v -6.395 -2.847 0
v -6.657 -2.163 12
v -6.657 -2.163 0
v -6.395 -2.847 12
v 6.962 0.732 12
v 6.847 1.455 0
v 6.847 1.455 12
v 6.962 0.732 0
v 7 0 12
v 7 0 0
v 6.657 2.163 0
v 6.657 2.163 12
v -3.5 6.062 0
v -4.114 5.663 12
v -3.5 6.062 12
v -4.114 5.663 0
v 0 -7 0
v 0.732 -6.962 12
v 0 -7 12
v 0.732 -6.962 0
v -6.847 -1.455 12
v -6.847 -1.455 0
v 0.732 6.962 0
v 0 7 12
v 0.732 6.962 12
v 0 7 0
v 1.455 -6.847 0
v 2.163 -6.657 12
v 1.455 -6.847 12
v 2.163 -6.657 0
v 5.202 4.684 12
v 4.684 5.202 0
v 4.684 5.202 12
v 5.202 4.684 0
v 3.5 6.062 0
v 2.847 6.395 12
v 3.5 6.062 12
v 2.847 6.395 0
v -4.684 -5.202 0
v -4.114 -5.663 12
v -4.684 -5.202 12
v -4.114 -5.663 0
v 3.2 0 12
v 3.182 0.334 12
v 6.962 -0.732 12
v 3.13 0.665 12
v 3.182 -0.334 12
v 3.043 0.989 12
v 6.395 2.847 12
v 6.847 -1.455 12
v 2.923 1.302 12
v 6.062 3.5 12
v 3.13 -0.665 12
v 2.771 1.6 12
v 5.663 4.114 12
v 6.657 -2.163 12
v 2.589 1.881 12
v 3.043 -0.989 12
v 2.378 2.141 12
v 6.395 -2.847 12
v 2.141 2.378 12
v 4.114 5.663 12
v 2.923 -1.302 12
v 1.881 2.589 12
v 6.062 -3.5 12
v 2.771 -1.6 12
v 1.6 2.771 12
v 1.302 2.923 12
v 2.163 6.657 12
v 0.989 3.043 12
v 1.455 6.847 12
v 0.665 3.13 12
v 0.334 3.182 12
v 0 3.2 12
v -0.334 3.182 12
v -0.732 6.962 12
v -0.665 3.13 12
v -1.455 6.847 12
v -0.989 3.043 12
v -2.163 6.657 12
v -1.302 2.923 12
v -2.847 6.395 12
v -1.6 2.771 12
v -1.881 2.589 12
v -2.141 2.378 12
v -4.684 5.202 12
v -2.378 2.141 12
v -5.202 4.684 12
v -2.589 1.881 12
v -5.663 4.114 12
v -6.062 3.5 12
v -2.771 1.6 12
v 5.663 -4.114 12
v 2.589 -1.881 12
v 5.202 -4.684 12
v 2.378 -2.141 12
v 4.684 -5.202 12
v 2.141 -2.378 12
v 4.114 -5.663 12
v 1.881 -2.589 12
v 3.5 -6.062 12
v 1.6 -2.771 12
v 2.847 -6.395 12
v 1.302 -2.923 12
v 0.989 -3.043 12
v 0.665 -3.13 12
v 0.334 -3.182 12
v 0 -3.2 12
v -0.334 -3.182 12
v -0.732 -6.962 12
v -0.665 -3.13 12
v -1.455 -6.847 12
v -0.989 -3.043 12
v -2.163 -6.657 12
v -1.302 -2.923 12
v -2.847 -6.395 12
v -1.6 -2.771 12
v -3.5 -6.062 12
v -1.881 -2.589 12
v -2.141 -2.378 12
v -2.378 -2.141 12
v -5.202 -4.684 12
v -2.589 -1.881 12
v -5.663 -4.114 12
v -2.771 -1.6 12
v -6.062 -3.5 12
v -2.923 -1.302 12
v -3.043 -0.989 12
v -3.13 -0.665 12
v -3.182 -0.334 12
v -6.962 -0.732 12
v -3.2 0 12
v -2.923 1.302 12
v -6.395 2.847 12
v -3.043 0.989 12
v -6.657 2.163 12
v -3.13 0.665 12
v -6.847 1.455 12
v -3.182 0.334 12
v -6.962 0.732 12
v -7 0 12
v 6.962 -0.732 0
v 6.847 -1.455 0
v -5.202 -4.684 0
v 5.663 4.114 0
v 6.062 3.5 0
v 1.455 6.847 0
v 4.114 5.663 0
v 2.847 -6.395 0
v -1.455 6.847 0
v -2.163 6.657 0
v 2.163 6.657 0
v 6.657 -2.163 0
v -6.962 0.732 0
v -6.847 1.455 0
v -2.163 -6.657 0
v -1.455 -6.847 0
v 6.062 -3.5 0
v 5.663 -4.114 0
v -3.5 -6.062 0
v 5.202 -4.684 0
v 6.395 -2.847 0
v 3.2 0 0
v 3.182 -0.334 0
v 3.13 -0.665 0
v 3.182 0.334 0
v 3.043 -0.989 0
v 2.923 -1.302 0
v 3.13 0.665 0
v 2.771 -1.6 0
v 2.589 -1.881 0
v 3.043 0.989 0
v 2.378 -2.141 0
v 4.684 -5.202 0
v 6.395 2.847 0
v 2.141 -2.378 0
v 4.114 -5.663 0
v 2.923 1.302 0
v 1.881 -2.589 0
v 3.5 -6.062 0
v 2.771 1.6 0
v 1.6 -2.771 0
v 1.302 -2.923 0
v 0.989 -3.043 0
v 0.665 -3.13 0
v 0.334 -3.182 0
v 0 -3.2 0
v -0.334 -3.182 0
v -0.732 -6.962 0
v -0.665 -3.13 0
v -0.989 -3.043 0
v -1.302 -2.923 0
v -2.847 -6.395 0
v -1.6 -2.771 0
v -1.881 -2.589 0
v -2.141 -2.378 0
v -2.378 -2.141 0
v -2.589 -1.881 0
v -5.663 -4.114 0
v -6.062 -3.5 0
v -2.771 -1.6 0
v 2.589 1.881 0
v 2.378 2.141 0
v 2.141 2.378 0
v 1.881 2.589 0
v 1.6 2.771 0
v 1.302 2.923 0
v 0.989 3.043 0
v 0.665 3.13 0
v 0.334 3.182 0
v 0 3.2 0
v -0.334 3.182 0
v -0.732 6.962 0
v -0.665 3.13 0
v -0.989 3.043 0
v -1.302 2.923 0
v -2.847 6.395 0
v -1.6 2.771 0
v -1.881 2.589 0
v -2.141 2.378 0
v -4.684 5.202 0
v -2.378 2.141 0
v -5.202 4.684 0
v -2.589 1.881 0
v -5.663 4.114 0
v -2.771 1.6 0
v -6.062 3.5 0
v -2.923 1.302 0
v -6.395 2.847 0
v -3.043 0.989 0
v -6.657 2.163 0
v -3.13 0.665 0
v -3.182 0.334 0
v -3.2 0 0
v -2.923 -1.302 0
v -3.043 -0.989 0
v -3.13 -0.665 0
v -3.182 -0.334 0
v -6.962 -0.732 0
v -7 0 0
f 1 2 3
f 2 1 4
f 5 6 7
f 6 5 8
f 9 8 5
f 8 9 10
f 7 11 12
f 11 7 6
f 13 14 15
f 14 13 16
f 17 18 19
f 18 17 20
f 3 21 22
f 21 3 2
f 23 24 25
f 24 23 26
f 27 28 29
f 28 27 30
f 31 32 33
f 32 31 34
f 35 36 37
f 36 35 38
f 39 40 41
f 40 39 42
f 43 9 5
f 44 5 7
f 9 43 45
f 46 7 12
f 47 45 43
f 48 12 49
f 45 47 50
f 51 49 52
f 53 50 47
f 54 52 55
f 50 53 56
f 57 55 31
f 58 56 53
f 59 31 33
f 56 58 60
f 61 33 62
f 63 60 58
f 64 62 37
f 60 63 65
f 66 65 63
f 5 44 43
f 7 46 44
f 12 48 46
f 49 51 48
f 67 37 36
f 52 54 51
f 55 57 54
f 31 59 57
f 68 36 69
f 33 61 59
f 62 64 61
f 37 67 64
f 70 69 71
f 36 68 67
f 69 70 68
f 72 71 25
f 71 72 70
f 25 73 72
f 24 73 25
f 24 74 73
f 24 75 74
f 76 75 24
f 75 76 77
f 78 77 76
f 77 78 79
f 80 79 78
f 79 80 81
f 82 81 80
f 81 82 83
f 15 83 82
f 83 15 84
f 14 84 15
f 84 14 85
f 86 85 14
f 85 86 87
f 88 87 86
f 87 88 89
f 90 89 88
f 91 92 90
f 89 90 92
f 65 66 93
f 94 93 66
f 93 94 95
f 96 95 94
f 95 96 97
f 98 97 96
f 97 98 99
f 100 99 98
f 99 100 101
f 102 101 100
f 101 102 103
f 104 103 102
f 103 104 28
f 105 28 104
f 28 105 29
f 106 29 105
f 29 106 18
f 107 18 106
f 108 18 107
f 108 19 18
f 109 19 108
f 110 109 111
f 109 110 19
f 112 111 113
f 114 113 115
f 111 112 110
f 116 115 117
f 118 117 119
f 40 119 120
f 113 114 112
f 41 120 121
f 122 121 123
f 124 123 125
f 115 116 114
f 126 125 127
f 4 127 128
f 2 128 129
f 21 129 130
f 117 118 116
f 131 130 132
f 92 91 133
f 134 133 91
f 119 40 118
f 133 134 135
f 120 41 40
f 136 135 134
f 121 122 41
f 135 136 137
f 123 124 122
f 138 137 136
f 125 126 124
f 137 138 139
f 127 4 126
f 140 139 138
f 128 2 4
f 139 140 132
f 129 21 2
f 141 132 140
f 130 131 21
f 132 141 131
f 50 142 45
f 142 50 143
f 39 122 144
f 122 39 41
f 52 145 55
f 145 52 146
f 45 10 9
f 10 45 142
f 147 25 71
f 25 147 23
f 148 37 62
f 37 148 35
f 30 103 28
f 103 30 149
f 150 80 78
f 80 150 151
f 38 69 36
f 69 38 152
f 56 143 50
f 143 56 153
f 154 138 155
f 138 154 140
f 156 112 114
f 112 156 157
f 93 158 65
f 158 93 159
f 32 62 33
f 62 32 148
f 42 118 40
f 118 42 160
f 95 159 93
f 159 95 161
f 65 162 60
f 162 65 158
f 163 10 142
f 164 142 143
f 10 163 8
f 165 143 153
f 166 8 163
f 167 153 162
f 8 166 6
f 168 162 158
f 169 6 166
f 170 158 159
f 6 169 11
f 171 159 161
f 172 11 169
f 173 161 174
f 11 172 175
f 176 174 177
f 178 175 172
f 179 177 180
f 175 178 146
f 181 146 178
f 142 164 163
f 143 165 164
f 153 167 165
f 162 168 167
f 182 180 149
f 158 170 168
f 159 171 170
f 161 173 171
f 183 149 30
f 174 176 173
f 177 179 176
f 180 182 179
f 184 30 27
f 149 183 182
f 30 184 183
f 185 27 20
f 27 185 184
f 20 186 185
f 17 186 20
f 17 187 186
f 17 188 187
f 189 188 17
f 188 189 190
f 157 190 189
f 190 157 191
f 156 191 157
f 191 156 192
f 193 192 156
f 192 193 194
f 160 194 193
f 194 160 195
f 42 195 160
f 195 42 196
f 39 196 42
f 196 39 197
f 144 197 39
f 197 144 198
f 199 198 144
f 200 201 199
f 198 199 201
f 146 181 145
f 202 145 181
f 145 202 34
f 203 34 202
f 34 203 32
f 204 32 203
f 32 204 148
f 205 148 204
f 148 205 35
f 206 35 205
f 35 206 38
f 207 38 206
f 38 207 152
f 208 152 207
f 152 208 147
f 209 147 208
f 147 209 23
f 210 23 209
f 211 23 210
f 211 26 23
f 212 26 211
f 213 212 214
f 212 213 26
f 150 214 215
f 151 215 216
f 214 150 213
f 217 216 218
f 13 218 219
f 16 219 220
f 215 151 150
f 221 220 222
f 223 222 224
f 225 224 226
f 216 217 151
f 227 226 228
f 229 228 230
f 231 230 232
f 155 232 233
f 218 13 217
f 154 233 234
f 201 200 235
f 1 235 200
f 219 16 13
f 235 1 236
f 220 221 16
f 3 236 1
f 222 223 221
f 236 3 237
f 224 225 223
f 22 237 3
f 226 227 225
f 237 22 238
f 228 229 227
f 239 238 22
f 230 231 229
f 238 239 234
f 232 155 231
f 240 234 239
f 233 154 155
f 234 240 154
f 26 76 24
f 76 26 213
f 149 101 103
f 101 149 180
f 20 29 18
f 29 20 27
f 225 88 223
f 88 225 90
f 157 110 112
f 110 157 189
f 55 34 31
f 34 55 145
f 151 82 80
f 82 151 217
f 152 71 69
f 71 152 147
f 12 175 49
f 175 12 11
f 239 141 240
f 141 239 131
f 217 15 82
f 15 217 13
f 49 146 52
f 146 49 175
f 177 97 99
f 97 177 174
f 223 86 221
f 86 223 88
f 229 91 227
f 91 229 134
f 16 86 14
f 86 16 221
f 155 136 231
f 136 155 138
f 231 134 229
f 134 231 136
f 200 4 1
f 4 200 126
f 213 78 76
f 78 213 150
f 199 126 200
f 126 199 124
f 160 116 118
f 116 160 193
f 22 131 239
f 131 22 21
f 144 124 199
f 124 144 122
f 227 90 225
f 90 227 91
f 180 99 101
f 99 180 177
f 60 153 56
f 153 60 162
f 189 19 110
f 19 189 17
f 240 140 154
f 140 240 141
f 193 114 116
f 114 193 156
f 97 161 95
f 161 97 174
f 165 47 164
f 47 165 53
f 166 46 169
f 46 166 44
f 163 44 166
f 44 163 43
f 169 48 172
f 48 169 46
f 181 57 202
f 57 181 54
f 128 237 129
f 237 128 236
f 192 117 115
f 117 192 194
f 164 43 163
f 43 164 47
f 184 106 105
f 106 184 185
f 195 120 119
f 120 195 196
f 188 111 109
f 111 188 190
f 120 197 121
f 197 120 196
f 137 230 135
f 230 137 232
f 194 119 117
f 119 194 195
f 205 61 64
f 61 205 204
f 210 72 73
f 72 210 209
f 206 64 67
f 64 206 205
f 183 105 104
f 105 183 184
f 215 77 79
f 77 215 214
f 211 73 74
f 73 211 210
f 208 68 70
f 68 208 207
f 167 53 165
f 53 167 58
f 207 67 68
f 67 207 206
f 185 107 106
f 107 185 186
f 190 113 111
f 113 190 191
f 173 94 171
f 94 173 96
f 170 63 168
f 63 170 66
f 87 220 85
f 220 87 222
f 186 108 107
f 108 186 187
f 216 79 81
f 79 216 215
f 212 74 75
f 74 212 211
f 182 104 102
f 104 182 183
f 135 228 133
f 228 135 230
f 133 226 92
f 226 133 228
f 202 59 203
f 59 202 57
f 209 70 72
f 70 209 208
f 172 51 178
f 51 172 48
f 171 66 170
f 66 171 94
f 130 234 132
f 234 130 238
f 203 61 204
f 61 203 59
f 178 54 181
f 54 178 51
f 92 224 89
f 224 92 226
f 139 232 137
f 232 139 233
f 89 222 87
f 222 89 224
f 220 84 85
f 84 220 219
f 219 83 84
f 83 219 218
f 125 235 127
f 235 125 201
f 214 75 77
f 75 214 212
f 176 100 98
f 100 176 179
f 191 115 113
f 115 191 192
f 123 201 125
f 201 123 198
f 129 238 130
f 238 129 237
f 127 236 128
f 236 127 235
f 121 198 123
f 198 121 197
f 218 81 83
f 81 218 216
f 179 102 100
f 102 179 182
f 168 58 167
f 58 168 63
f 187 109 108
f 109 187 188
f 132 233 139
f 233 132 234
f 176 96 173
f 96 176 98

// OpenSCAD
// Round spacer.
$fn = 60;
eps = 0.02;
inner_d = 6.4;
outer_d = 14;
length = 12;
difference() { cylinder(d=outer_d,h=length); translate([0,0,-eps]) cylinder(d=inner_d,h=length+2*eps); }
